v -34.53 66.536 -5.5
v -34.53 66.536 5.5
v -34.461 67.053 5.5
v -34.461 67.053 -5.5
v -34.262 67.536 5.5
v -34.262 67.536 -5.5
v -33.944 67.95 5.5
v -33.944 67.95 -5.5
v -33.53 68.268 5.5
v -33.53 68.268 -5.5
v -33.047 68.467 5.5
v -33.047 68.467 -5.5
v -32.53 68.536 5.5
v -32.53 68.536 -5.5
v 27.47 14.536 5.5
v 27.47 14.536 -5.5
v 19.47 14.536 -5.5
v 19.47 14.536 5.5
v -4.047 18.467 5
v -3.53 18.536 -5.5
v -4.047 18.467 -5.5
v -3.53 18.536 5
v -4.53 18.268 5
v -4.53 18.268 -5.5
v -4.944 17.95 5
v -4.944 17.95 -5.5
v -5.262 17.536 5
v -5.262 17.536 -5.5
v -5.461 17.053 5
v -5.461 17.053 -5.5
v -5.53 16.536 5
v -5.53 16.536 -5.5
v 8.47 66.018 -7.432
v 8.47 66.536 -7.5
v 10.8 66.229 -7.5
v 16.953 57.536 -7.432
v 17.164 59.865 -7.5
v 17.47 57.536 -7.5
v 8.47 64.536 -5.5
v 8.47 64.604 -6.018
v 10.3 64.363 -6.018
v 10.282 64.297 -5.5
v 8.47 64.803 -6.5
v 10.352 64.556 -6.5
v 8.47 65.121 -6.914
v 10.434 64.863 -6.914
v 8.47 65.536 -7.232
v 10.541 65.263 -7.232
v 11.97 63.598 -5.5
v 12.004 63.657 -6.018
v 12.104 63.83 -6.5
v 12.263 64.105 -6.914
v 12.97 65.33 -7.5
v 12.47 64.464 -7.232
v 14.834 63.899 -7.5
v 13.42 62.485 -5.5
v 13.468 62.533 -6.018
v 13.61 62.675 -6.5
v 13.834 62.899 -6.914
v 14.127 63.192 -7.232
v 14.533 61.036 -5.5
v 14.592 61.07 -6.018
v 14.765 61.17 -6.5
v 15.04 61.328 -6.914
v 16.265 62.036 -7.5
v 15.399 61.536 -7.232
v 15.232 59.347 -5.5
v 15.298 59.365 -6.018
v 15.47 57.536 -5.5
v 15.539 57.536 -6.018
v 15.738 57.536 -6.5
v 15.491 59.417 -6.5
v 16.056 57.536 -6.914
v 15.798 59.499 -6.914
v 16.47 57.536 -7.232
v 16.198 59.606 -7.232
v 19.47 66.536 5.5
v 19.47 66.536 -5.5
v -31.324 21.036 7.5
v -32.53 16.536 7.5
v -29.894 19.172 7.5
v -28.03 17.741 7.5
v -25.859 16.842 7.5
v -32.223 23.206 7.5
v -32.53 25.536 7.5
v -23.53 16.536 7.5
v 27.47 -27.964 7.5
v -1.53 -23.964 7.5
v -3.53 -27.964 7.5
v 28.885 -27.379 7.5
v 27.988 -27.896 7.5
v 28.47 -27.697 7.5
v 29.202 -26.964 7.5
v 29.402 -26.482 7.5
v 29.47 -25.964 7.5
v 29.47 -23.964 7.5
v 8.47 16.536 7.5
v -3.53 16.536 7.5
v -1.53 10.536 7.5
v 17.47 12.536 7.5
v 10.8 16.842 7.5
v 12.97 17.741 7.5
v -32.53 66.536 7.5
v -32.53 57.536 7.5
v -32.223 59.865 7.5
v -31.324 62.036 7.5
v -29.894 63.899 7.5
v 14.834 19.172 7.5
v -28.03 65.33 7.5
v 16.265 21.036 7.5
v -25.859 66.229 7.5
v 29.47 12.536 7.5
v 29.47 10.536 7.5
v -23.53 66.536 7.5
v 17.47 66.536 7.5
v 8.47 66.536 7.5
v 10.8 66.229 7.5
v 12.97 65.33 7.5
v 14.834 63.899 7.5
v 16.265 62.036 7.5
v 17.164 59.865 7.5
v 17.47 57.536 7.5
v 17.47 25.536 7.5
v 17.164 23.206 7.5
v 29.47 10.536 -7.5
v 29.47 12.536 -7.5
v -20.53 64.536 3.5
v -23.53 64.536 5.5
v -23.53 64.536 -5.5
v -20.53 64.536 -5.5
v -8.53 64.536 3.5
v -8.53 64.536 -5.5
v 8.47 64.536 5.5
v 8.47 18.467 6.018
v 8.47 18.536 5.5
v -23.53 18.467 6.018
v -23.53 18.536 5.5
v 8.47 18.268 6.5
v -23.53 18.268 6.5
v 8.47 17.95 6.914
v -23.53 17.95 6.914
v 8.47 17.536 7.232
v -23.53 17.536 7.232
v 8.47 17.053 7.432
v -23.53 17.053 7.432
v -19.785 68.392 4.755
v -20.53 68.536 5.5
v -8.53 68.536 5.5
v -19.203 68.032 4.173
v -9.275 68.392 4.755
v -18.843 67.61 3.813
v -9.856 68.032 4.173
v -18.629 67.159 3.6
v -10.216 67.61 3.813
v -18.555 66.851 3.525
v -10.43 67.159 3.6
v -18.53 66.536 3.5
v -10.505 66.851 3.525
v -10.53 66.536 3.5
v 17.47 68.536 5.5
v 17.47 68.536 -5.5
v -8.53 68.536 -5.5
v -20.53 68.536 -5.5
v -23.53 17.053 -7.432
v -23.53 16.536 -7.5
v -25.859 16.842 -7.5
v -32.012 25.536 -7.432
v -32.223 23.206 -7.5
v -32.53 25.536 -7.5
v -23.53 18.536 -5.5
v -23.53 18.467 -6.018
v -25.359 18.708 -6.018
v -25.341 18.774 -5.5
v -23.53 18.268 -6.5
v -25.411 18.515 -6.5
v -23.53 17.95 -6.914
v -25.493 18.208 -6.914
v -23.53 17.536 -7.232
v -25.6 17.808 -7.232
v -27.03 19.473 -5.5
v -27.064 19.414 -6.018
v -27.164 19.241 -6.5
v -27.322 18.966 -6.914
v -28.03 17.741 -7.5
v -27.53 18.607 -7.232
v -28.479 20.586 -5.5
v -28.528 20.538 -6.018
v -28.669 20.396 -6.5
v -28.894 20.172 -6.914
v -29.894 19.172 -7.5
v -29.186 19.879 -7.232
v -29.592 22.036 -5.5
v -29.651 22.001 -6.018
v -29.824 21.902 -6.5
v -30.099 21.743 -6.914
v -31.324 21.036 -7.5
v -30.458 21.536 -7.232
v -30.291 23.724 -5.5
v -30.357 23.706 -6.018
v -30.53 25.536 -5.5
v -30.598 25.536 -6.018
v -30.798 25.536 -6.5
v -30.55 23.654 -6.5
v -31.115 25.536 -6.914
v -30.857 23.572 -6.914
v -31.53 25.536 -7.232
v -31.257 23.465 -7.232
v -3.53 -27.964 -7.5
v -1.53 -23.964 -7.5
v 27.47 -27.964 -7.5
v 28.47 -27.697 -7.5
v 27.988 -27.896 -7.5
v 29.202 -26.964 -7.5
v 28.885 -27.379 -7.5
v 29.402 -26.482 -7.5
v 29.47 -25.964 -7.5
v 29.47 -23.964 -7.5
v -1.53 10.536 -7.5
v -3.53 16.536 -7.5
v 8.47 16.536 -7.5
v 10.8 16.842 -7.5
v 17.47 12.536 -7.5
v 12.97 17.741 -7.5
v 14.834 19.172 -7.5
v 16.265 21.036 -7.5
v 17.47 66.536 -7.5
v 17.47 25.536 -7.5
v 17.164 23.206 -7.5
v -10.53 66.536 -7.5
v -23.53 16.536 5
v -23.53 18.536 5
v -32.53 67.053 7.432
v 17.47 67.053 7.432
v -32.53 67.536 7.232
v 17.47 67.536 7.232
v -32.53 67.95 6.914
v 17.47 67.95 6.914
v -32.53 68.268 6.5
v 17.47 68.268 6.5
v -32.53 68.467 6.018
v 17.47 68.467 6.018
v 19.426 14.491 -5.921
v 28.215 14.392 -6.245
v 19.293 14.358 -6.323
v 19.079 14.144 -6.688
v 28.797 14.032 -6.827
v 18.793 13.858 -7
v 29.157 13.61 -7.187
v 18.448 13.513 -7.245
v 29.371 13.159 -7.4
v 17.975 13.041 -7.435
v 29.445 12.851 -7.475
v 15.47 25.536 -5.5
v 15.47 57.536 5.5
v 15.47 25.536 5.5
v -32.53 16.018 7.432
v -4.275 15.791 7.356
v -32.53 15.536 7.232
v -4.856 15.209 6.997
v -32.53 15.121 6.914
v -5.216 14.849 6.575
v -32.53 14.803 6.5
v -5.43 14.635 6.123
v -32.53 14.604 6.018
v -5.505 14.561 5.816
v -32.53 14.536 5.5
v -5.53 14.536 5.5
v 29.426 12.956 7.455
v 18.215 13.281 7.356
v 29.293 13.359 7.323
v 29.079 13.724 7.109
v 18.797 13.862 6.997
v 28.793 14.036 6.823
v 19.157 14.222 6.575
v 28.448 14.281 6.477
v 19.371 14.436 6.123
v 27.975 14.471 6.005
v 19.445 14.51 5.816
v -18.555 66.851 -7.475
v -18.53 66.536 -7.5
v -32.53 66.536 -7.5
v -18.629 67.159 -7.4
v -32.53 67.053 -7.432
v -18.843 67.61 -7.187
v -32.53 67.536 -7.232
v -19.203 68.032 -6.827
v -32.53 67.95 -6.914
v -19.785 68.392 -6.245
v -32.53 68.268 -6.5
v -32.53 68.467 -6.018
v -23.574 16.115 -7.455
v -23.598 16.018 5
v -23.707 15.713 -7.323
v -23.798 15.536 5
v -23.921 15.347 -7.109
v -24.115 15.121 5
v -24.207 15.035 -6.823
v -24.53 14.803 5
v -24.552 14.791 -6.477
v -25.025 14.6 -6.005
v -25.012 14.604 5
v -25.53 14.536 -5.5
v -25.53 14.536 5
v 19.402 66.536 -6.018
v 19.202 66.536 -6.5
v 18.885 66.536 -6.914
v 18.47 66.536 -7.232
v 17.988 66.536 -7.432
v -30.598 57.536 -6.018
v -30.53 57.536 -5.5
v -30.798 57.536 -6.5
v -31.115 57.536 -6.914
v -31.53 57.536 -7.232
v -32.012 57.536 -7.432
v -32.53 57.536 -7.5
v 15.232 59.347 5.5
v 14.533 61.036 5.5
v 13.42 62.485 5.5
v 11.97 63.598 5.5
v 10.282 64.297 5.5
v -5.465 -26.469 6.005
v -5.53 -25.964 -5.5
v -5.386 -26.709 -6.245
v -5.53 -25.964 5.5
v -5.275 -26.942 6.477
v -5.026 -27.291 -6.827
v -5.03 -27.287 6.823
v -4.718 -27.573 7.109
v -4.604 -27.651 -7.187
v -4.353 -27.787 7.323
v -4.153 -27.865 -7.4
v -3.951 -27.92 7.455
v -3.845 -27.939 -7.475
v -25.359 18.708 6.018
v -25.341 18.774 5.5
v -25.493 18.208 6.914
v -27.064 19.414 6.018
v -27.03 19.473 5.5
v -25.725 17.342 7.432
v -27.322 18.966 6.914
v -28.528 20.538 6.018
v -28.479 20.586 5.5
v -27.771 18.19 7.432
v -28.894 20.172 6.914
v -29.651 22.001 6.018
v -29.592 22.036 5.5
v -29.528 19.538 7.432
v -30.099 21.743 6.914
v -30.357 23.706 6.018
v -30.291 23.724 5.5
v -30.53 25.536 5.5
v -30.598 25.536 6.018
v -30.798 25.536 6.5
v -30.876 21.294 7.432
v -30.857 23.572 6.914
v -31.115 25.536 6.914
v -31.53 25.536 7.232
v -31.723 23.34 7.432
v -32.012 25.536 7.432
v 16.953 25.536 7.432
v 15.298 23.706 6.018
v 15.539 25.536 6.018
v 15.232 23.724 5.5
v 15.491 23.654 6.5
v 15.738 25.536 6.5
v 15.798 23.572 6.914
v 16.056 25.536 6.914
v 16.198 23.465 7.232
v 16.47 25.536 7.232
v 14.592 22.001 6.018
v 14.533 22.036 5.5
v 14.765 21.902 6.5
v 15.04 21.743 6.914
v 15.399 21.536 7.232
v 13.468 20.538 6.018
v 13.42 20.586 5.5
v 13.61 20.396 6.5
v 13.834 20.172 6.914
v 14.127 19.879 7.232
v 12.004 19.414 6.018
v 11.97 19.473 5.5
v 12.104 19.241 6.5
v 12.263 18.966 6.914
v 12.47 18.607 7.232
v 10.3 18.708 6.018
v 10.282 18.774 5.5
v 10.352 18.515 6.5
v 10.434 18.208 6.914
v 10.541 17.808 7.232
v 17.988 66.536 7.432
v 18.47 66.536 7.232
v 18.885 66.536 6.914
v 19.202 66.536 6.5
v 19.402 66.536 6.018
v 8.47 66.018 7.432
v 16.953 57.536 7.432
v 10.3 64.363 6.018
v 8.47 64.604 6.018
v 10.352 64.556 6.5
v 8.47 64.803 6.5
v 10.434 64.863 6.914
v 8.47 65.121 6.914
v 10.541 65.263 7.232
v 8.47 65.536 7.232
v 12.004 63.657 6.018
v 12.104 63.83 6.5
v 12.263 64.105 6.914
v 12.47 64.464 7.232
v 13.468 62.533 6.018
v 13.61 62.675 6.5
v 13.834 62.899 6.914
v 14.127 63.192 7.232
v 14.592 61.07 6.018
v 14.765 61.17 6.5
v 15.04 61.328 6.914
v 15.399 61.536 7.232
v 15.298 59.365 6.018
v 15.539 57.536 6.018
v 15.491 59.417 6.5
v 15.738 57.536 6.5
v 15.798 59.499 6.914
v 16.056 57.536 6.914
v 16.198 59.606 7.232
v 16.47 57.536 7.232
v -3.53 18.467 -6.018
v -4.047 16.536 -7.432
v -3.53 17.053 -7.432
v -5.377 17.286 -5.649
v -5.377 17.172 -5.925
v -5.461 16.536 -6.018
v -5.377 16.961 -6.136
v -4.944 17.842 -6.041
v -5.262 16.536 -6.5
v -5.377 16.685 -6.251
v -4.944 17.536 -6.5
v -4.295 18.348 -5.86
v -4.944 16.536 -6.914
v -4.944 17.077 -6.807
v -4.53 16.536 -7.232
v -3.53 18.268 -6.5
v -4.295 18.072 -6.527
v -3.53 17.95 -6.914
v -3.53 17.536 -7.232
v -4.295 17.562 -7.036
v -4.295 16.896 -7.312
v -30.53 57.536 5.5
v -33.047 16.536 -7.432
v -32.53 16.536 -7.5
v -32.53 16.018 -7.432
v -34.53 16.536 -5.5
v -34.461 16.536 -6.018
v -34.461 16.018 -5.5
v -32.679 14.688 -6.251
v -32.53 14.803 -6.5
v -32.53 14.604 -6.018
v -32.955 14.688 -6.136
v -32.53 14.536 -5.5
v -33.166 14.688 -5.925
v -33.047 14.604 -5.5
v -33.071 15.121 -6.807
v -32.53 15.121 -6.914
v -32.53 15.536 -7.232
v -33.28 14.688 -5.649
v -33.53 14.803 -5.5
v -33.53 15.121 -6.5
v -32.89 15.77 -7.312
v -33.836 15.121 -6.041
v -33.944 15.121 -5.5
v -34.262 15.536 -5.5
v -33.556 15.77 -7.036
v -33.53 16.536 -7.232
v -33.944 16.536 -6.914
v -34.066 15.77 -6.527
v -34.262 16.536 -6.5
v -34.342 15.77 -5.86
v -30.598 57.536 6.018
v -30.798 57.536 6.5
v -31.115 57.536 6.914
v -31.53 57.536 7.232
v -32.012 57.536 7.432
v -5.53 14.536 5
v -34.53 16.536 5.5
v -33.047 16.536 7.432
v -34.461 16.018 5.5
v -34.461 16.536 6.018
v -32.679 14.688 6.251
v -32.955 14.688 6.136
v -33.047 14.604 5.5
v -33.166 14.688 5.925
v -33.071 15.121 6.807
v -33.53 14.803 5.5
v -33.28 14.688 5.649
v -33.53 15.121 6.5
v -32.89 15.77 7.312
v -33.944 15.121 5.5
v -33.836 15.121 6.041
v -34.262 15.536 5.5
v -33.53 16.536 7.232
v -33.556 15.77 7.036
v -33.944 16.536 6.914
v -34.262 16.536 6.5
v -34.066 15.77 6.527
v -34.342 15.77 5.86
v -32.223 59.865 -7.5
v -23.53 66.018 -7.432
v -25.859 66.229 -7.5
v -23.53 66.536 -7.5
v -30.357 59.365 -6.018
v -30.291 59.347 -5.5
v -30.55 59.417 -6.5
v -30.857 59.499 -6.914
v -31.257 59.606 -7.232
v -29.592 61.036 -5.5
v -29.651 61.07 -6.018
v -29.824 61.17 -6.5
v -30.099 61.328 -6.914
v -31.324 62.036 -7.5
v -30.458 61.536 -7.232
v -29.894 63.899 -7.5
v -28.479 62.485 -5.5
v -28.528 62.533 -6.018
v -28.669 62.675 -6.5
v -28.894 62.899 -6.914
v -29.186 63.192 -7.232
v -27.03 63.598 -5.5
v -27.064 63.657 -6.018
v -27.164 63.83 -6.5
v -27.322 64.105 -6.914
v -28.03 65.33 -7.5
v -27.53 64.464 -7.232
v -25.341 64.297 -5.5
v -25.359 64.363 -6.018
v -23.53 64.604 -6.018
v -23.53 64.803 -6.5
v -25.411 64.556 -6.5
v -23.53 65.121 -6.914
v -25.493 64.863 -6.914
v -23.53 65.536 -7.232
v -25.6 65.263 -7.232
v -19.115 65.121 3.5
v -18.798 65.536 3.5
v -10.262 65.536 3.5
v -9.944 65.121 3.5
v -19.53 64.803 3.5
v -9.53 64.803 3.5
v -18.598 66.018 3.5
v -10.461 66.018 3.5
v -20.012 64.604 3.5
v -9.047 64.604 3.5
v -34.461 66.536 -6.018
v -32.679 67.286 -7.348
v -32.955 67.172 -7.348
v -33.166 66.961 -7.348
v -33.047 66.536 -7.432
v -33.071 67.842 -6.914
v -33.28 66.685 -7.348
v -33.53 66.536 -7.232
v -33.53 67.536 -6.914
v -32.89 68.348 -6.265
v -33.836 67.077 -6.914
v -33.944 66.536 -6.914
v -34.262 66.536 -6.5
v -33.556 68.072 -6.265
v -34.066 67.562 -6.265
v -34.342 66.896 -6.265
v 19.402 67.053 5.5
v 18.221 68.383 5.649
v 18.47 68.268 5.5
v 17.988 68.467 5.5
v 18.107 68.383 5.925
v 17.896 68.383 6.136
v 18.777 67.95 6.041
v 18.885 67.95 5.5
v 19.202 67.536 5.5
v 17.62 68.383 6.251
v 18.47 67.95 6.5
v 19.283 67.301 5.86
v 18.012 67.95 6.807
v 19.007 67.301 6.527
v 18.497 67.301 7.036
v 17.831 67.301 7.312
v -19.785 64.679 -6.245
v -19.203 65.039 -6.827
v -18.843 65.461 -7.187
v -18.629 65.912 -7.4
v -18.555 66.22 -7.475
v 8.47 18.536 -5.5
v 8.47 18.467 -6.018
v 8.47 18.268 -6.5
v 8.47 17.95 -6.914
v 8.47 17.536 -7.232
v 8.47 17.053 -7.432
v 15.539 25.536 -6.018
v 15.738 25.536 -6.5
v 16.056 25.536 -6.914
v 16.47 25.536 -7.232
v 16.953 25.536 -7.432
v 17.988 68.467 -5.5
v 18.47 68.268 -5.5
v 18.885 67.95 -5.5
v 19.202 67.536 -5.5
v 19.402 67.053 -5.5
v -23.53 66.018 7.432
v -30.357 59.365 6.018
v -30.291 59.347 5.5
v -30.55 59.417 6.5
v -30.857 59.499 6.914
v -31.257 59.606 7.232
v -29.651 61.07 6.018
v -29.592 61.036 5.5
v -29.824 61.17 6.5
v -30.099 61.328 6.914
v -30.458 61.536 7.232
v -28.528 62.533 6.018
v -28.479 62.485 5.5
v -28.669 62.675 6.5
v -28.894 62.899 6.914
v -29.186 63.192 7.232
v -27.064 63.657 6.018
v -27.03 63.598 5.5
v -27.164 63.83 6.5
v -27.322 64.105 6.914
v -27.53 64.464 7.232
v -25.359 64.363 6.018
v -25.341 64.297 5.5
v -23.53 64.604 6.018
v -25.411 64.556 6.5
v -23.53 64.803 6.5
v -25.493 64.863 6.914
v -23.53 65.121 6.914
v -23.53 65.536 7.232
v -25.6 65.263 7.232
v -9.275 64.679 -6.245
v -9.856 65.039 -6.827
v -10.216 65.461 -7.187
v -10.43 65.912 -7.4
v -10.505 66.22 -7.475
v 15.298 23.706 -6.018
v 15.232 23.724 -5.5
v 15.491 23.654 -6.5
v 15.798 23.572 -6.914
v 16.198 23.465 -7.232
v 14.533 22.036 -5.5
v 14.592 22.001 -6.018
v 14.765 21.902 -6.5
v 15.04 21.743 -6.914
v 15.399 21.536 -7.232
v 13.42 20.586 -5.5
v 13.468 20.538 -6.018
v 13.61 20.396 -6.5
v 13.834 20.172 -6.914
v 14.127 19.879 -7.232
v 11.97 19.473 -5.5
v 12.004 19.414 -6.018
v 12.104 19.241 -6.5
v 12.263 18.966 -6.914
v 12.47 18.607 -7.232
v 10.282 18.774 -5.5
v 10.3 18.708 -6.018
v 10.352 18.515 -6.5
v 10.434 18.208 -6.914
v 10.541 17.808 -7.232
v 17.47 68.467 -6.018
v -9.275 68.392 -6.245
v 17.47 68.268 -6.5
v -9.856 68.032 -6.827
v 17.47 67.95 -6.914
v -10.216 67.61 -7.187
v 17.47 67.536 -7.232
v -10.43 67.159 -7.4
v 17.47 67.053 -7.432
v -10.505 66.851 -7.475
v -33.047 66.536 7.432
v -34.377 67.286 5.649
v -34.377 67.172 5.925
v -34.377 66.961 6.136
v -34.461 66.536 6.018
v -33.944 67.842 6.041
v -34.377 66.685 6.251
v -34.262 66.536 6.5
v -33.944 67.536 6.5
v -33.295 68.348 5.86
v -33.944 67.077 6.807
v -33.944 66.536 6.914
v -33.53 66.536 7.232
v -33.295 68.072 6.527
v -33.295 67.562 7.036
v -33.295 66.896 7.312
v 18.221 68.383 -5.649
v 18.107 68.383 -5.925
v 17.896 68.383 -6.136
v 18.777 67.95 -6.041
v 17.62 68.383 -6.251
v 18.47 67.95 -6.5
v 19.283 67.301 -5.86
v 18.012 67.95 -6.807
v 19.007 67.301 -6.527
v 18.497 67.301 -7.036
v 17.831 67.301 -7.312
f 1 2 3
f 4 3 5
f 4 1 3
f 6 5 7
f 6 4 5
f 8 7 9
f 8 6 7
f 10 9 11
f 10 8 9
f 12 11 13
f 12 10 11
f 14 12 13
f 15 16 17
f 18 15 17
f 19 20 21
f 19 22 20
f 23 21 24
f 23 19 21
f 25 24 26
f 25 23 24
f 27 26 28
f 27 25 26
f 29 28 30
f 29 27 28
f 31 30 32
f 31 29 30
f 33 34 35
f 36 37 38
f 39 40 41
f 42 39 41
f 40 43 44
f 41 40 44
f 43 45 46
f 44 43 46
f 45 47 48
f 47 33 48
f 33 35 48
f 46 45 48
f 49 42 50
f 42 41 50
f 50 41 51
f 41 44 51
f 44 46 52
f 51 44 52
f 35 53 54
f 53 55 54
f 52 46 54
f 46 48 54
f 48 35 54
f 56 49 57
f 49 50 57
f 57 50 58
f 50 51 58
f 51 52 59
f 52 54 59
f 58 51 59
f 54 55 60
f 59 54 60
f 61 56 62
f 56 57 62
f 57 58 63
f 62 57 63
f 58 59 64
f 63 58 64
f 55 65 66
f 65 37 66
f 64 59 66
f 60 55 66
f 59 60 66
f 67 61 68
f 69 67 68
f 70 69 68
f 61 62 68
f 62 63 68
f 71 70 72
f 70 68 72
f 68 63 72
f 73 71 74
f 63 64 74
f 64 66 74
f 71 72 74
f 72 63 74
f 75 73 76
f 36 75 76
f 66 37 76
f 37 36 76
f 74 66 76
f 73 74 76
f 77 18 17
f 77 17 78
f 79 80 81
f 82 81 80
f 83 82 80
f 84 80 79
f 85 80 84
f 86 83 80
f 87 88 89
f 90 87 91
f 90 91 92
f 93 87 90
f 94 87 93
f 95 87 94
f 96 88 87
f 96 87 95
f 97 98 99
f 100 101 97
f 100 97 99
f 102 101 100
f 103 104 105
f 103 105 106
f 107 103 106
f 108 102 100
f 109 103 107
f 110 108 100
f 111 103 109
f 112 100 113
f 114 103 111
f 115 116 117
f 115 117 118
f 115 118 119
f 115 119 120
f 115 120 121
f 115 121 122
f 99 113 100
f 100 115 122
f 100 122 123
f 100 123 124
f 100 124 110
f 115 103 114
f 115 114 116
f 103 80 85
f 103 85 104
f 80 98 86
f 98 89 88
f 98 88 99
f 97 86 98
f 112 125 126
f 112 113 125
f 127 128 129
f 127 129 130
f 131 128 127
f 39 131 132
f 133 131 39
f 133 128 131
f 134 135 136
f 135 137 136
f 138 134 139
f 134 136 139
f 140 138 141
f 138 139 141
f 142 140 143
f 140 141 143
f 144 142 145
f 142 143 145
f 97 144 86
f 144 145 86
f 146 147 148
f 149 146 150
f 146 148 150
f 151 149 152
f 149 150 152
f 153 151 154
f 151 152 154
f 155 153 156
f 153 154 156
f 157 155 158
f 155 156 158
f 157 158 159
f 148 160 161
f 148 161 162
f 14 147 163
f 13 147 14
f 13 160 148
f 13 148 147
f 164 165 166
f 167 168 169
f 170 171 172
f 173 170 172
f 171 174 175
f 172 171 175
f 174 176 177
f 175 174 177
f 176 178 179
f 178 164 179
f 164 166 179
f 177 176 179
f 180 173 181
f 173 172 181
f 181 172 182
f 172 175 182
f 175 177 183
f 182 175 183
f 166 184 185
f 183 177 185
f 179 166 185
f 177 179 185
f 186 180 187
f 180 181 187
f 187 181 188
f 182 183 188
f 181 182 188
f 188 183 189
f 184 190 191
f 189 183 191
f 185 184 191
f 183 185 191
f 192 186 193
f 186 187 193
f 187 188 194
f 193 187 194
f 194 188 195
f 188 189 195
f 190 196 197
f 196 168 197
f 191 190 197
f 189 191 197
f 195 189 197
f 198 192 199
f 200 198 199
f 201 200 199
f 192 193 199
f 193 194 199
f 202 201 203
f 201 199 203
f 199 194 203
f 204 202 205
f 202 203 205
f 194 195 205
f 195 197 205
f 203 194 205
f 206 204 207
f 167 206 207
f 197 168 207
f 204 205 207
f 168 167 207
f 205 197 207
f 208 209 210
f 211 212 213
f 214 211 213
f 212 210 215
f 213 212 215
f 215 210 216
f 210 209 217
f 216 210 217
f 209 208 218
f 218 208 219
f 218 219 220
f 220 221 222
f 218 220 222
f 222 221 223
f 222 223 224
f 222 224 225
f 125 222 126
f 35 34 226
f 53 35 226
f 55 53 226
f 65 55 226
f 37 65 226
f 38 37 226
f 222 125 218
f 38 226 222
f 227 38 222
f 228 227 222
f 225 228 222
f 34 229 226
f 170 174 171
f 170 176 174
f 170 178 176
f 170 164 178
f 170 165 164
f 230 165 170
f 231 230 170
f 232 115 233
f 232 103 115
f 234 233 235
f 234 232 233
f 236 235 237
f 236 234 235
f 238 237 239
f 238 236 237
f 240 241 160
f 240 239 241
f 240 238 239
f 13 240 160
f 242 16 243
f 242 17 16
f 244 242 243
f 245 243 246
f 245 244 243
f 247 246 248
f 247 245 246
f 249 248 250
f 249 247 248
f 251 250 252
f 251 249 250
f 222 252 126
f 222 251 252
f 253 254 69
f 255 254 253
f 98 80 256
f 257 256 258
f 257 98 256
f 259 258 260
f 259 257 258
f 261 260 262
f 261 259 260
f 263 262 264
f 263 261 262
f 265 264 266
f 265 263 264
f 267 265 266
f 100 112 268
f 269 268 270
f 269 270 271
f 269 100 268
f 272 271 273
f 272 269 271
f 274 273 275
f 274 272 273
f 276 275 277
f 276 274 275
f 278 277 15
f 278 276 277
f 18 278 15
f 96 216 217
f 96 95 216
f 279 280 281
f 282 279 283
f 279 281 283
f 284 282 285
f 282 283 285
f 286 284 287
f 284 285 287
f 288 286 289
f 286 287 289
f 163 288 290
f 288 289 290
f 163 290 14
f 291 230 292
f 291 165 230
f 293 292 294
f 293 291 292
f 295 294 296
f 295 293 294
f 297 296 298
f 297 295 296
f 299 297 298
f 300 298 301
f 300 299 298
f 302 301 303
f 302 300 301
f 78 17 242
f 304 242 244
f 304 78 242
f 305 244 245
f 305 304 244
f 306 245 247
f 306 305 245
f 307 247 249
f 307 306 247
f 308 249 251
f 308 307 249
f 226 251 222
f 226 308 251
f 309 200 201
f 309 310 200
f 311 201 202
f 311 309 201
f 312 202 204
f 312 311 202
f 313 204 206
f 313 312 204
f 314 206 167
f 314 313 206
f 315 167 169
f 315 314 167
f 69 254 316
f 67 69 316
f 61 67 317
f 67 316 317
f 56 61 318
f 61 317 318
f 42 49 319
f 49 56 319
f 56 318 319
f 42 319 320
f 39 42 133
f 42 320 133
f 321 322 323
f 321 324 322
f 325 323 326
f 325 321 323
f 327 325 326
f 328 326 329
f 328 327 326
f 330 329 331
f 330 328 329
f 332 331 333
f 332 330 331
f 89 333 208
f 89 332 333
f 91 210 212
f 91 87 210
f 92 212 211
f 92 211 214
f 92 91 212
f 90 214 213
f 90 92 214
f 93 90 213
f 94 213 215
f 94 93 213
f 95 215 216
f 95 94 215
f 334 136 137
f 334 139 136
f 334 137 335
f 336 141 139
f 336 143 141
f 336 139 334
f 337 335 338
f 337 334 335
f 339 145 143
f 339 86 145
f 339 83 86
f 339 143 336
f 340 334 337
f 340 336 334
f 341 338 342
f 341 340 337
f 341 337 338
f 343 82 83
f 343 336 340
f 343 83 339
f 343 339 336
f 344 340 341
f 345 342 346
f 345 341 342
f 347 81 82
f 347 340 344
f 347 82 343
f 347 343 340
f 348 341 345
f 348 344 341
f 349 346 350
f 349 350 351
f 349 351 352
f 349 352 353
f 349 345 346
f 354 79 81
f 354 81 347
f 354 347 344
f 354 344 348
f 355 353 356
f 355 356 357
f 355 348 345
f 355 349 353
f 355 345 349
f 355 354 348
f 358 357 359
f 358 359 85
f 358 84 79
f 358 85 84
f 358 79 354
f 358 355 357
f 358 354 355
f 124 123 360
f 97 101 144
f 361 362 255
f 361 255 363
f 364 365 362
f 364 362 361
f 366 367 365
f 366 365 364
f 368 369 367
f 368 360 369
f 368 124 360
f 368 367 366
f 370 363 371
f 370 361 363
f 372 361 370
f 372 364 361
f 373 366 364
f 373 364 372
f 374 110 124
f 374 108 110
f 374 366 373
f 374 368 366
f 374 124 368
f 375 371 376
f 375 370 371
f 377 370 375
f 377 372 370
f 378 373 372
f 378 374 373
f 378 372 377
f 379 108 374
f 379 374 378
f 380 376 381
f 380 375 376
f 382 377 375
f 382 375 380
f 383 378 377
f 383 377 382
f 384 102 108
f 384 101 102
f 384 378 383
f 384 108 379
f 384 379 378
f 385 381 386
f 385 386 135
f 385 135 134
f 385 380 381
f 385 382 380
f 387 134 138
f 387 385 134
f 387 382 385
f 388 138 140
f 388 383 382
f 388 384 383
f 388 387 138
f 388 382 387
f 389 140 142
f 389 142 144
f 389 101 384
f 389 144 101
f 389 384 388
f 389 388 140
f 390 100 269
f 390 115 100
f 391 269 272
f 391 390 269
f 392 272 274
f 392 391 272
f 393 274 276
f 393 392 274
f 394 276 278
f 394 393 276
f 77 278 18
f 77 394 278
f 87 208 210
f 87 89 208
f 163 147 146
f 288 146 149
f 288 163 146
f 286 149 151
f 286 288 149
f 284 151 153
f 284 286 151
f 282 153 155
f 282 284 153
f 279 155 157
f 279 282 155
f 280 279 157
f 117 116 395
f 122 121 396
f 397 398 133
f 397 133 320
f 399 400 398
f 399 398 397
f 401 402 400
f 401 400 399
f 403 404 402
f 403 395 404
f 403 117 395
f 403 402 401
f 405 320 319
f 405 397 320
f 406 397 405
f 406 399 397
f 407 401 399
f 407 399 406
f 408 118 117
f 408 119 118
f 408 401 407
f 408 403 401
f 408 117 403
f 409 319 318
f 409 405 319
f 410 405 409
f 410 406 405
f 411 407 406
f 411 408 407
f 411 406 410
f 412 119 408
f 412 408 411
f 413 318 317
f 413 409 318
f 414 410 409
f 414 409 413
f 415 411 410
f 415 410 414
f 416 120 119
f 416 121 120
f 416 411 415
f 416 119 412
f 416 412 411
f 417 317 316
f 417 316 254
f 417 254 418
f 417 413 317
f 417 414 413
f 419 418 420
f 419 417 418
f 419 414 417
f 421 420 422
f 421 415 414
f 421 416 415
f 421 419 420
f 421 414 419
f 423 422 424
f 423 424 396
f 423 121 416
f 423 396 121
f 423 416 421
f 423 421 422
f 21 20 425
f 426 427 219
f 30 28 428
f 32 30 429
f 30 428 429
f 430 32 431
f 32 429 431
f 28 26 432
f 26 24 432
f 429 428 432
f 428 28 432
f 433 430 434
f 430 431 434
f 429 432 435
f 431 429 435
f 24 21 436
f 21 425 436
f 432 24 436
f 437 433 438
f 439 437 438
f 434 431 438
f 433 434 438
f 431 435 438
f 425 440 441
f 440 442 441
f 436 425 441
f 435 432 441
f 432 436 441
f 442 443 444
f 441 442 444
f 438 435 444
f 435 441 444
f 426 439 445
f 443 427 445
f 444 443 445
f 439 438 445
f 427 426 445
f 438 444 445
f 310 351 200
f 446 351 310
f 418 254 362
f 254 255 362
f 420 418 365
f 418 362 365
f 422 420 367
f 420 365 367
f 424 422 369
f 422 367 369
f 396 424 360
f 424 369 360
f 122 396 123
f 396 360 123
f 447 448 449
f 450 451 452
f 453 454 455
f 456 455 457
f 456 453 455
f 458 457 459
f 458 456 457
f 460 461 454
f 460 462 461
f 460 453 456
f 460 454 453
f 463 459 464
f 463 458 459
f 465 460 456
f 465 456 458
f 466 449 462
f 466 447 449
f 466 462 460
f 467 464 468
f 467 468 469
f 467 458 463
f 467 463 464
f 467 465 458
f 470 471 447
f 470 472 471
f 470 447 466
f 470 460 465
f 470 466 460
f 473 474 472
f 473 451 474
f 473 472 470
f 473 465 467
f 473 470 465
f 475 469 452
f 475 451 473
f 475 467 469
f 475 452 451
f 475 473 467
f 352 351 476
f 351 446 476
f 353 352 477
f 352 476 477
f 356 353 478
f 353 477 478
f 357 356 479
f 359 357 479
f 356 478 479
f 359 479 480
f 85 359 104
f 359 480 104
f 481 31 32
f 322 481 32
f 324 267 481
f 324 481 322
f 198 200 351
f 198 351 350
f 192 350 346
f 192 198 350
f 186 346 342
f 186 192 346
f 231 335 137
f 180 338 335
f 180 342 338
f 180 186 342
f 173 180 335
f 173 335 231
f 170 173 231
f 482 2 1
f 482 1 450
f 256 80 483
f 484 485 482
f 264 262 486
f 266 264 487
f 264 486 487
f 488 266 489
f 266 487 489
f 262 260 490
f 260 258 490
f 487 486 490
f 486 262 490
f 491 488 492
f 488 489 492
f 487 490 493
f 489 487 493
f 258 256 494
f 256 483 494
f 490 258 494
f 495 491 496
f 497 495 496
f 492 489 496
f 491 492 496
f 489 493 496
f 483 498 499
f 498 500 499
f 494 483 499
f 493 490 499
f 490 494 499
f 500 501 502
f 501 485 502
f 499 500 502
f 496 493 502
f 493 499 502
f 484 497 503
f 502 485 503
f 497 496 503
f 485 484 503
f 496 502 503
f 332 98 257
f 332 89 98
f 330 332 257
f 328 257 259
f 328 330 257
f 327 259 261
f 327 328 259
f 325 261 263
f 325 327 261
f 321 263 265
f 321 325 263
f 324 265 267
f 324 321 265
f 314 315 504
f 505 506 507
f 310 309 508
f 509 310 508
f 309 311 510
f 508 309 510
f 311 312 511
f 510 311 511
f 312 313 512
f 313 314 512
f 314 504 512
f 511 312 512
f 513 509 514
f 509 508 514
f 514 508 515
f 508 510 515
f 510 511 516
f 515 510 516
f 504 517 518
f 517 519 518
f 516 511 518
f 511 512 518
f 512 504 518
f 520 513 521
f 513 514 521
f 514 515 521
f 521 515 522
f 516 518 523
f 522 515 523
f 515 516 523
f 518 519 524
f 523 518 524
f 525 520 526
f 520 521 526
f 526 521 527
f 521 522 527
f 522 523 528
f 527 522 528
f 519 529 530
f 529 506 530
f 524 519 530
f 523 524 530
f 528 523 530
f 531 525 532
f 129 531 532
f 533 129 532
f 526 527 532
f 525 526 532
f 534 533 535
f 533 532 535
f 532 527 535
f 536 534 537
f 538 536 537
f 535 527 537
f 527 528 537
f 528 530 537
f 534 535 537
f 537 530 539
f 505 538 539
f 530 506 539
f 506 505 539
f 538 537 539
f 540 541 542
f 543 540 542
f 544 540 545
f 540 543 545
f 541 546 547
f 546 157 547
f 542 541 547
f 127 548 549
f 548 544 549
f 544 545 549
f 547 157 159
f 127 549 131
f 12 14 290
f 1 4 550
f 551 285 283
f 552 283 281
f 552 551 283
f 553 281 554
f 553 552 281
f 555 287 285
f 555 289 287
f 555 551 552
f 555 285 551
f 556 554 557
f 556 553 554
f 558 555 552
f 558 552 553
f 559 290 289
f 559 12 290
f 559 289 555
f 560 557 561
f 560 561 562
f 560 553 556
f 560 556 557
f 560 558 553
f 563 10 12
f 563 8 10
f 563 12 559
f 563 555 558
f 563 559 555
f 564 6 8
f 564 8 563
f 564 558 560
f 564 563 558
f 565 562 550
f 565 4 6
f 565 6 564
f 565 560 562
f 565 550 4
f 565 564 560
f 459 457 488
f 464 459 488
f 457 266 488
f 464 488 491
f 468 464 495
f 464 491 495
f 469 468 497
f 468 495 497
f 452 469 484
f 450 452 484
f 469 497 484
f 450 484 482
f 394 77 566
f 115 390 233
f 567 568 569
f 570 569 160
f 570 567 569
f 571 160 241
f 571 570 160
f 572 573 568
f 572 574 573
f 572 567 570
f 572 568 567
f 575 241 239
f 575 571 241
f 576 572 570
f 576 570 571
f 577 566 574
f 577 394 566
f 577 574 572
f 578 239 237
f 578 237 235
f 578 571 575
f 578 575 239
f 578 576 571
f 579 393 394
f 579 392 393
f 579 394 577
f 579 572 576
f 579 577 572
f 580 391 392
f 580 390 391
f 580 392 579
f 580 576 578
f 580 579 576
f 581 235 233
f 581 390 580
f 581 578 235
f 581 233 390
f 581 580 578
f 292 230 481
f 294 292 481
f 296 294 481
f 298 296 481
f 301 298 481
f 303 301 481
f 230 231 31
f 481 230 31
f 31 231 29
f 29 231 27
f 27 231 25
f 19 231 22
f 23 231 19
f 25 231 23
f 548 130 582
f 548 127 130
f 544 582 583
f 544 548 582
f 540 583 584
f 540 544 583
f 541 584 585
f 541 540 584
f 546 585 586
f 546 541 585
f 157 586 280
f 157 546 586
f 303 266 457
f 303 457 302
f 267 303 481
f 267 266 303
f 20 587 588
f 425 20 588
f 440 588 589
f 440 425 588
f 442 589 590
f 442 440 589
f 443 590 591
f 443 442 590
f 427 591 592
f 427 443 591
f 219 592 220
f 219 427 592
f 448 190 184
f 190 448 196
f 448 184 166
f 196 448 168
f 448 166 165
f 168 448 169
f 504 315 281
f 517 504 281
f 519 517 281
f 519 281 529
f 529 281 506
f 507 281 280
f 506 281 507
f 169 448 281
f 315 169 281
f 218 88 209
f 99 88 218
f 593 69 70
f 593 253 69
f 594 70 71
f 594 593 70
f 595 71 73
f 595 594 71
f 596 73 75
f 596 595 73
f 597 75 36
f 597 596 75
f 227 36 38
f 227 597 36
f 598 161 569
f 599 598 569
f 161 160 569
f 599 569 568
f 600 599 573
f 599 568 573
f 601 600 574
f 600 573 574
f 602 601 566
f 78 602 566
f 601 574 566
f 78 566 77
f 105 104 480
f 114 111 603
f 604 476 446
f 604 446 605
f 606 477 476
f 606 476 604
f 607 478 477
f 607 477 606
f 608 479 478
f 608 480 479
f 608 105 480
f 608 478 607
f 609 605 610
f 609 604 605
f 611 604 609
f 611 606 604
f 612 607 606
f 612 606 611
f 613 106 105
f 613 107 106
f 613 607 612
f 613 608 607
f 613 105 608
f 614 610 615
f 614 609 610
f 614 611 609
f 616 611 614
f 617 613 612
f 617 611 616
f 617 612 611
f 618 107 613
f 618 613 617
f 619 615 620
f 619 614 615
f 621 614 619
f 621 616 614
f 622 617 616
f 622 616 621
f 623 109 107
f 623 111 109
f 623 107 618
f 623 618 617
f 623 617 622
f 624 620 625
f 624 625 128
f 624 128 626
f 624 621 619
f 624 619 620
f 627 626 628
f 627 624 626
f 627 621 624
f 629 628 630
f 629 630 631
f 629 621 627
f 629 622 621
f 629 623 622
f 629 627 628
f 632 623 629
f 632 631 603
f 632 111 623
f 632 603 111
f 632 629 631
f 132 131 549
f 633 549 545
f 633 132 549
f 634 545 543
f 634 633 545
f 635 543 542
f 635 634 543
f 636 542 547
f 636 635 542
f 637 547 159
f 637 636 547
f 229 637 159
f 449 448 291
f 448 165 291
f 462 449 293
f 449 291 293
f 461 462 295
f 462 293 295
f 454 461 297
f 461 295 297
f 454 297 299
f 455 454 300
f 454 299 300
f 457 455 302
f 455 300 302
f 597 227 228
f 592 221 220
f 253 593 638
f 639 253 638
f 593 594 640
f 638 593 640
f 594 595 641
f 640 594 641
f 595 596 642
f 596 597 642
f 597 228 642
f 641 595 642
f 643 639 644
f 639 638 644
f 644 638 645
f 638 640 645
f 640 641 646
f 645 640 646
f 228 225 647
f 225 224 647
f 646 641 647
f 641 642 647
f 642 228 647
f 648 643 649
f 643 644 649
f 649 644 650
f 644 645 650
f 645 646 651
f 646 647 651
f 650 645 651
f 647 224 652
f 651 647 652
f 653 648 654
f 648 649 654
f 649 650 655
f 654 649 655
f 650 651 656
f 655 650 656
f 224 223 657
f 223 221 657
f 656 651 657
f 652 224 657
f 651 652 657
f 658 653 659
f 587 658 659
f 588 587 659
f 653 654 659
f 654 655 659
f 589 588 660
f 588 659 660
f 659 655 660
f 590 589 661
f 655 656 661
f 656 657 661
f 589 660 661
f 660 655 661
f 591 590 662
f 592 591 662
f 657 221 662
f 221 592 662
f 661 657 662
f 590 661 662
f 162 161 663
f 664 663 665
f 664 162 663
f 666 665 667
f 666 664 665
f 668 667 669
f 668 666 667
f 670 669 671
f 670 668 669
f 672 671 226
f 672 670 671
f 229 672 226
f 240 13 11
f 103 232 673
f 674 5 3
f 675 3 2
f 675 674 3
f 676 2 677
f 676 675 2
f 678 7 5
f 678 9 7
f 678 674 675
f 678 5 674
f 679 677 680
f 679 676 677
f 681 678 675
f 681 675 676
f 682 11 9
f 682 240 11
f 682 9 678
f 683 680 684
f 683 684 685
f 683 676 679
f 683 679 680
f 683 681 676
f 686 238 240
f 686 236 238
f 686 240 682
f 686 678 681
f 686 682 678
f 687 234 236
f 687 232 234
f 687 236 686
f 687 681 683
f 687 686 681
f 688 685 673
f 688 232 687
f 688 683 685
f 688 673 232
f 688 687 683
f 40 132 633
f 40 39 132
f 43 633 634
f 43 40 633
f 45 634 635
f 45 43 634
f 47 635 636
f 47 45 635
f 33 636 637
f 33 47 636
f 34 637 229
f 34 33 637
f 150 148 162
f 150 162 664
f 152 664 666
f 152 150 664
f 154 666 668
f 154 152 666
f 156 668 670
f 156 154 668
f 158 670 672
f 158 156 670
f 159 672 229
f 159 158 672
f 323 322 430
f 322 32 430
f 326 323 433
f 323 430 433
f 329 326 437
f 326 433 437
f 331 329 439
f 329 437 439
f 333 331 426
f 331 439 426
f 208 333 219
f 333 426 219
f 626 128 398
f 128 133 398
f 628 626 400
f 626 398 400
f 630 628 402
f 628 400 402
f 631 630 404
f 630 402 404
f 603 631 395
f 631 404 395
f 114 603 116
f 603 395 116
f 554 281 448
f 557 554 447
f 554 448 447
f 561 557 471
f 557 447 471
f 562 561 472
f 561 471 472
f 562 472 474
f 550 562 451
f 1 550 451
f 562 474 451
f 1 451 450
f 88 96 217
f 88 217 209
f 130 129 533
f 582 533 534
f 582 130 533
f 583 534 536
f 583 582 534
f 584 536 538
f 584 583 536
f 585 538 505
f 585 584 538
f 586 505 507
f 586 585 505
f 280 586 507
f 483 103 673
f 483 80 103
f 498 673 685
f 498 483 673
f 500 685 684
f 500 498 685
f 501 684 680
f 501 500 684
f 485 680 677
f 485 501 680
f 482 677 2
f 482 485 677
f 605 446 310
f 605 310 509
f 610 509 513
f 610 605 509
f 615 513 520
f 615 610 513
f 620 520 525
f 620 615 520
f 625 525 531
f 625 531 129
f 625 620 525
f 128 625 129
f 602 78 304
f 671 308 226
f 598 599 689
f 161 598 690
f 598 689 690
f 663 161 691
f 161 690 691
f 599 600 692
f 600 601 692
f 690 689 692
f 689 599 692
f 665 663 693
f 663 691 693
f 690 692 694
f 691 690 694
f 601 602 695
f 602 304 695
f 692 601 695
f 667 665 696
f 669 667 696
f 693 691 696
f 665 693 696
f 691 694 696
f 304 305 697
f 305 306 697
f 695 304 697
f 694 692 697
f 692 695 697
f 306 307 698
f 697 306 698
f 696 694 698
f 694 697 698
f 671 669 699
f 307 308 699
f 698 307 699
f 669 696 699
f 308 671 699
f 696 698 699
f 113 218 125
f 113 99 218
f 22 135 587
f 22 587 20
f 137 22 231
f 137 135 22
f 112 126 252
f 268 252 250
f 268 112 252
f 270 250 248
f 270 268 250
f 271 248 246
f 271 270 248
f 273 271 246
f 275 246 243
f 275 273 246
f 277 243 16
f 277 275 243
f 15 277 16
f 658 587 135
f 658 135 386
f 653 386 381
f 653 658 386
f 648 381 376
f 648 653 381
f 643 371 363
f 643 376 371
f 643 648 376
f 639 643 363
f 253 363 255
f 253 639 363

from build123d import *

# Parameters (mm, degrees)
F1_DEPTH = 7.5
F2_W     = 18
F2_H     = 4
F2_W_2   = 8
F3_DEPTH = 7.5
F4_DEPTH = 5
F5_DEPTH = 25
F6_DEPTH = 3.5
F7_DEPTH = 25
F8_R     = 7
F9_R     = 1.99999


# Not quite as in the source:
# - a fillet or chamfer is up to 0.001 mm smaller than in the source, because OpenCascade refuses the exact size


with BuildPart() as f1:
    # F0 (on Top) → F1 (new body, symmetric)
    with BuildSketch(Plane.XY):
        Polygon((29.4704200836, 10.5355388032), (29.4704200836, 14.5355388032), (-5.5295799164, 14.5355388032), (-5.5295799164, -27.9644611968), (29.4704200836, -27.9644611968), (29.4704200836, -23.9644611968), (27.4704200836, -23.9644611968), (-1.5295799164, -23.9644611968), (-1.5295799164, 10.5355388032), (27.4704200836, 10.5355388032), align=None)
    extrude(amount=F1_DEPTH, both=True)

    # F2 (on Top) → F3 (join, symmetric)
    with BuildSketch(Plane.XY):
        Polygon((-30.5295799164, 18.5355388032), (-30.5295799164, 64.5355388032), (-18.5295799164, 64.5355388032), (-18.5295799164, 68.5355388032), (-34.5295799164, 68.5355388032), (-34.5295799164, 14.5355388032), (-23.5295799164, 14.5355388032), (-23.5295799164, 18.5355388032), align=None)
        Polygon((-10.5295799164, 68.5355388032), (-10.5295799164, 64.5355388032), (15.4704200836, 64.5355388032), (15.4704200836, 18.5355388032), (-5.5295799164, 18.5355388032), (-5.5295799164, 14.5355388032), (19.4704200836, 14.5355388032), (19.4704200836, 68.5355388032), align=None)
        with Locations((-14.5295799164, 16.5355388032)):
            Rectangle(F2_W, F2_H)
        with Locations((-14.5295799164, 66.5355388032)):
            Rectangle(F2_W_2, F2_H)
    extrude(amount=F3_DEPTH, both=True)

    # F2 (on Top) → F4 (cut, symmetric)
    with BuildSketch(Plane.XY):
        with Locations((-14.5295799164, 16.5355388032)):
            Rectangle(F2_W, F2_H)
    extrude(amount=F4_DEPTH, both=True, mode=Mode.SUBTRACT)

    # F2 (on Top) → F5 (cut)
    with BuildSketch(Plane.XY):
        with Locations((-14.5295799164, 16.5355388032)):
            Rectangle(F2_W, F2_H)
    extrude(amount=-F5_DEPTH, mode=Mode.SUBTRACT)

    # F2 (on Top) → F6 (cut, symmetric)
    with BuildSketch(Plane.XY):
        with Locations((-14.5295799164, 66.5355388032)):
            Rectangle(F2_W_2, F2_H)
    extrude(amount=F6_DEPTH, both=True, mode=Mode.SUBTRACT)

    # F2 (on Top) → F7 (cut)
    with BuildSketch(Plane.XY):
        with Locations((-14.5295799164, 66.5355388032)):
            Rectangle(F2_W_2, F2_H)
    extrude(amount=-F7_DEPTH, mode=Mode.SUBTRACT)

    # F8
    f8_edges = [f1.edges().sort_by_distance(p)[0] for p in [
        (-30.52958, 64.535539, 0),
        (15.47042, 64.535539, 0),
        (-30.52958, 18.535539, 0),
        (15.47042, 18.535539, 0),
    ]]
    fillet(f8_edges, radius=F8_R)

    # F9 (radius 2 in the source; OpenCascade refuses exactly that, so slightly less here)
    f9_edges = [f1.edges().sort_by_distance(p)[0] for p in [
        (19.47042, 41.535539, 7.5),
        (19.47042, 41.535539, -7.5),
        (24.47042, 14.535539, 7.5),
        (24.47042, 14.535539, -7.5),
        (19.47042, 68.535539, 0),
        (4.47042, 68.535539, -7.5),
        (-7.52958, 68.535539, 7.5),
        (-14.52958, 68.535539, 3.5),
        (-18.52958, 68.535539, -2),
        (-10.52958, 68.535539, -2),
        (-10.52958, 64.535539, -2),
        (-18.52958, 64.535539, -2),
        (-34.52958, 68.535539, 0),
        (-26.52958, 68.535539, -7.5),
        (-30.52958, 41.535539, -7.5),
        (15.47042, 41.535539, -7.5),
        (-34.52958, 41.535539, -7.5),
        (-29.02958, 14.535539, -7.5),
        (-34.52958, 41.535539, 7.5),
        (-20.02958, 14.535539, 7.5),
        (-30.52958, 41.535539, 7.5),
        (-23.52958, 14.535539, -1.25),
        (-5.52958, 18.535539, -1.25),
        (-5.52958, -4.714461, -7.5),
        (-5.52958, -6.714461, 7.5),
        (29.47042, -27.964461, 0),
        (-5.52958, -27.964461, 0),
        (-34.52958, 14.535539, 0),
        (29.47042, 14.535539, 0),
        (-21.02958, 64.535539, -7.5),
        (-28.479327, 62.485286, -7.5),
        (-28.479327, 20.585791, -7.5),
        (-28.479327, 20.585791, 7.5),
        (-7.52958, 64.535539, 7.5),
        (-1.02958, 64.535539, -7.5),
        (-28.479327, 62.485286, 7.5),
        (-7.52958, 18.535539, 7.5),
        (13.420168, 20.585791, 7.5),
        (13.420168, 62.485286, 7.5),
        (15.47042, 41.535539, 7.5),
        (1.47042, 18.535539, -7.5),
        (13.420168, 62.485286, -7.5),
        (13.420168, 20.585791, -7.5),
    ]]
    fillet(f9_edges, radius=F9_R)


solid = f1.part
